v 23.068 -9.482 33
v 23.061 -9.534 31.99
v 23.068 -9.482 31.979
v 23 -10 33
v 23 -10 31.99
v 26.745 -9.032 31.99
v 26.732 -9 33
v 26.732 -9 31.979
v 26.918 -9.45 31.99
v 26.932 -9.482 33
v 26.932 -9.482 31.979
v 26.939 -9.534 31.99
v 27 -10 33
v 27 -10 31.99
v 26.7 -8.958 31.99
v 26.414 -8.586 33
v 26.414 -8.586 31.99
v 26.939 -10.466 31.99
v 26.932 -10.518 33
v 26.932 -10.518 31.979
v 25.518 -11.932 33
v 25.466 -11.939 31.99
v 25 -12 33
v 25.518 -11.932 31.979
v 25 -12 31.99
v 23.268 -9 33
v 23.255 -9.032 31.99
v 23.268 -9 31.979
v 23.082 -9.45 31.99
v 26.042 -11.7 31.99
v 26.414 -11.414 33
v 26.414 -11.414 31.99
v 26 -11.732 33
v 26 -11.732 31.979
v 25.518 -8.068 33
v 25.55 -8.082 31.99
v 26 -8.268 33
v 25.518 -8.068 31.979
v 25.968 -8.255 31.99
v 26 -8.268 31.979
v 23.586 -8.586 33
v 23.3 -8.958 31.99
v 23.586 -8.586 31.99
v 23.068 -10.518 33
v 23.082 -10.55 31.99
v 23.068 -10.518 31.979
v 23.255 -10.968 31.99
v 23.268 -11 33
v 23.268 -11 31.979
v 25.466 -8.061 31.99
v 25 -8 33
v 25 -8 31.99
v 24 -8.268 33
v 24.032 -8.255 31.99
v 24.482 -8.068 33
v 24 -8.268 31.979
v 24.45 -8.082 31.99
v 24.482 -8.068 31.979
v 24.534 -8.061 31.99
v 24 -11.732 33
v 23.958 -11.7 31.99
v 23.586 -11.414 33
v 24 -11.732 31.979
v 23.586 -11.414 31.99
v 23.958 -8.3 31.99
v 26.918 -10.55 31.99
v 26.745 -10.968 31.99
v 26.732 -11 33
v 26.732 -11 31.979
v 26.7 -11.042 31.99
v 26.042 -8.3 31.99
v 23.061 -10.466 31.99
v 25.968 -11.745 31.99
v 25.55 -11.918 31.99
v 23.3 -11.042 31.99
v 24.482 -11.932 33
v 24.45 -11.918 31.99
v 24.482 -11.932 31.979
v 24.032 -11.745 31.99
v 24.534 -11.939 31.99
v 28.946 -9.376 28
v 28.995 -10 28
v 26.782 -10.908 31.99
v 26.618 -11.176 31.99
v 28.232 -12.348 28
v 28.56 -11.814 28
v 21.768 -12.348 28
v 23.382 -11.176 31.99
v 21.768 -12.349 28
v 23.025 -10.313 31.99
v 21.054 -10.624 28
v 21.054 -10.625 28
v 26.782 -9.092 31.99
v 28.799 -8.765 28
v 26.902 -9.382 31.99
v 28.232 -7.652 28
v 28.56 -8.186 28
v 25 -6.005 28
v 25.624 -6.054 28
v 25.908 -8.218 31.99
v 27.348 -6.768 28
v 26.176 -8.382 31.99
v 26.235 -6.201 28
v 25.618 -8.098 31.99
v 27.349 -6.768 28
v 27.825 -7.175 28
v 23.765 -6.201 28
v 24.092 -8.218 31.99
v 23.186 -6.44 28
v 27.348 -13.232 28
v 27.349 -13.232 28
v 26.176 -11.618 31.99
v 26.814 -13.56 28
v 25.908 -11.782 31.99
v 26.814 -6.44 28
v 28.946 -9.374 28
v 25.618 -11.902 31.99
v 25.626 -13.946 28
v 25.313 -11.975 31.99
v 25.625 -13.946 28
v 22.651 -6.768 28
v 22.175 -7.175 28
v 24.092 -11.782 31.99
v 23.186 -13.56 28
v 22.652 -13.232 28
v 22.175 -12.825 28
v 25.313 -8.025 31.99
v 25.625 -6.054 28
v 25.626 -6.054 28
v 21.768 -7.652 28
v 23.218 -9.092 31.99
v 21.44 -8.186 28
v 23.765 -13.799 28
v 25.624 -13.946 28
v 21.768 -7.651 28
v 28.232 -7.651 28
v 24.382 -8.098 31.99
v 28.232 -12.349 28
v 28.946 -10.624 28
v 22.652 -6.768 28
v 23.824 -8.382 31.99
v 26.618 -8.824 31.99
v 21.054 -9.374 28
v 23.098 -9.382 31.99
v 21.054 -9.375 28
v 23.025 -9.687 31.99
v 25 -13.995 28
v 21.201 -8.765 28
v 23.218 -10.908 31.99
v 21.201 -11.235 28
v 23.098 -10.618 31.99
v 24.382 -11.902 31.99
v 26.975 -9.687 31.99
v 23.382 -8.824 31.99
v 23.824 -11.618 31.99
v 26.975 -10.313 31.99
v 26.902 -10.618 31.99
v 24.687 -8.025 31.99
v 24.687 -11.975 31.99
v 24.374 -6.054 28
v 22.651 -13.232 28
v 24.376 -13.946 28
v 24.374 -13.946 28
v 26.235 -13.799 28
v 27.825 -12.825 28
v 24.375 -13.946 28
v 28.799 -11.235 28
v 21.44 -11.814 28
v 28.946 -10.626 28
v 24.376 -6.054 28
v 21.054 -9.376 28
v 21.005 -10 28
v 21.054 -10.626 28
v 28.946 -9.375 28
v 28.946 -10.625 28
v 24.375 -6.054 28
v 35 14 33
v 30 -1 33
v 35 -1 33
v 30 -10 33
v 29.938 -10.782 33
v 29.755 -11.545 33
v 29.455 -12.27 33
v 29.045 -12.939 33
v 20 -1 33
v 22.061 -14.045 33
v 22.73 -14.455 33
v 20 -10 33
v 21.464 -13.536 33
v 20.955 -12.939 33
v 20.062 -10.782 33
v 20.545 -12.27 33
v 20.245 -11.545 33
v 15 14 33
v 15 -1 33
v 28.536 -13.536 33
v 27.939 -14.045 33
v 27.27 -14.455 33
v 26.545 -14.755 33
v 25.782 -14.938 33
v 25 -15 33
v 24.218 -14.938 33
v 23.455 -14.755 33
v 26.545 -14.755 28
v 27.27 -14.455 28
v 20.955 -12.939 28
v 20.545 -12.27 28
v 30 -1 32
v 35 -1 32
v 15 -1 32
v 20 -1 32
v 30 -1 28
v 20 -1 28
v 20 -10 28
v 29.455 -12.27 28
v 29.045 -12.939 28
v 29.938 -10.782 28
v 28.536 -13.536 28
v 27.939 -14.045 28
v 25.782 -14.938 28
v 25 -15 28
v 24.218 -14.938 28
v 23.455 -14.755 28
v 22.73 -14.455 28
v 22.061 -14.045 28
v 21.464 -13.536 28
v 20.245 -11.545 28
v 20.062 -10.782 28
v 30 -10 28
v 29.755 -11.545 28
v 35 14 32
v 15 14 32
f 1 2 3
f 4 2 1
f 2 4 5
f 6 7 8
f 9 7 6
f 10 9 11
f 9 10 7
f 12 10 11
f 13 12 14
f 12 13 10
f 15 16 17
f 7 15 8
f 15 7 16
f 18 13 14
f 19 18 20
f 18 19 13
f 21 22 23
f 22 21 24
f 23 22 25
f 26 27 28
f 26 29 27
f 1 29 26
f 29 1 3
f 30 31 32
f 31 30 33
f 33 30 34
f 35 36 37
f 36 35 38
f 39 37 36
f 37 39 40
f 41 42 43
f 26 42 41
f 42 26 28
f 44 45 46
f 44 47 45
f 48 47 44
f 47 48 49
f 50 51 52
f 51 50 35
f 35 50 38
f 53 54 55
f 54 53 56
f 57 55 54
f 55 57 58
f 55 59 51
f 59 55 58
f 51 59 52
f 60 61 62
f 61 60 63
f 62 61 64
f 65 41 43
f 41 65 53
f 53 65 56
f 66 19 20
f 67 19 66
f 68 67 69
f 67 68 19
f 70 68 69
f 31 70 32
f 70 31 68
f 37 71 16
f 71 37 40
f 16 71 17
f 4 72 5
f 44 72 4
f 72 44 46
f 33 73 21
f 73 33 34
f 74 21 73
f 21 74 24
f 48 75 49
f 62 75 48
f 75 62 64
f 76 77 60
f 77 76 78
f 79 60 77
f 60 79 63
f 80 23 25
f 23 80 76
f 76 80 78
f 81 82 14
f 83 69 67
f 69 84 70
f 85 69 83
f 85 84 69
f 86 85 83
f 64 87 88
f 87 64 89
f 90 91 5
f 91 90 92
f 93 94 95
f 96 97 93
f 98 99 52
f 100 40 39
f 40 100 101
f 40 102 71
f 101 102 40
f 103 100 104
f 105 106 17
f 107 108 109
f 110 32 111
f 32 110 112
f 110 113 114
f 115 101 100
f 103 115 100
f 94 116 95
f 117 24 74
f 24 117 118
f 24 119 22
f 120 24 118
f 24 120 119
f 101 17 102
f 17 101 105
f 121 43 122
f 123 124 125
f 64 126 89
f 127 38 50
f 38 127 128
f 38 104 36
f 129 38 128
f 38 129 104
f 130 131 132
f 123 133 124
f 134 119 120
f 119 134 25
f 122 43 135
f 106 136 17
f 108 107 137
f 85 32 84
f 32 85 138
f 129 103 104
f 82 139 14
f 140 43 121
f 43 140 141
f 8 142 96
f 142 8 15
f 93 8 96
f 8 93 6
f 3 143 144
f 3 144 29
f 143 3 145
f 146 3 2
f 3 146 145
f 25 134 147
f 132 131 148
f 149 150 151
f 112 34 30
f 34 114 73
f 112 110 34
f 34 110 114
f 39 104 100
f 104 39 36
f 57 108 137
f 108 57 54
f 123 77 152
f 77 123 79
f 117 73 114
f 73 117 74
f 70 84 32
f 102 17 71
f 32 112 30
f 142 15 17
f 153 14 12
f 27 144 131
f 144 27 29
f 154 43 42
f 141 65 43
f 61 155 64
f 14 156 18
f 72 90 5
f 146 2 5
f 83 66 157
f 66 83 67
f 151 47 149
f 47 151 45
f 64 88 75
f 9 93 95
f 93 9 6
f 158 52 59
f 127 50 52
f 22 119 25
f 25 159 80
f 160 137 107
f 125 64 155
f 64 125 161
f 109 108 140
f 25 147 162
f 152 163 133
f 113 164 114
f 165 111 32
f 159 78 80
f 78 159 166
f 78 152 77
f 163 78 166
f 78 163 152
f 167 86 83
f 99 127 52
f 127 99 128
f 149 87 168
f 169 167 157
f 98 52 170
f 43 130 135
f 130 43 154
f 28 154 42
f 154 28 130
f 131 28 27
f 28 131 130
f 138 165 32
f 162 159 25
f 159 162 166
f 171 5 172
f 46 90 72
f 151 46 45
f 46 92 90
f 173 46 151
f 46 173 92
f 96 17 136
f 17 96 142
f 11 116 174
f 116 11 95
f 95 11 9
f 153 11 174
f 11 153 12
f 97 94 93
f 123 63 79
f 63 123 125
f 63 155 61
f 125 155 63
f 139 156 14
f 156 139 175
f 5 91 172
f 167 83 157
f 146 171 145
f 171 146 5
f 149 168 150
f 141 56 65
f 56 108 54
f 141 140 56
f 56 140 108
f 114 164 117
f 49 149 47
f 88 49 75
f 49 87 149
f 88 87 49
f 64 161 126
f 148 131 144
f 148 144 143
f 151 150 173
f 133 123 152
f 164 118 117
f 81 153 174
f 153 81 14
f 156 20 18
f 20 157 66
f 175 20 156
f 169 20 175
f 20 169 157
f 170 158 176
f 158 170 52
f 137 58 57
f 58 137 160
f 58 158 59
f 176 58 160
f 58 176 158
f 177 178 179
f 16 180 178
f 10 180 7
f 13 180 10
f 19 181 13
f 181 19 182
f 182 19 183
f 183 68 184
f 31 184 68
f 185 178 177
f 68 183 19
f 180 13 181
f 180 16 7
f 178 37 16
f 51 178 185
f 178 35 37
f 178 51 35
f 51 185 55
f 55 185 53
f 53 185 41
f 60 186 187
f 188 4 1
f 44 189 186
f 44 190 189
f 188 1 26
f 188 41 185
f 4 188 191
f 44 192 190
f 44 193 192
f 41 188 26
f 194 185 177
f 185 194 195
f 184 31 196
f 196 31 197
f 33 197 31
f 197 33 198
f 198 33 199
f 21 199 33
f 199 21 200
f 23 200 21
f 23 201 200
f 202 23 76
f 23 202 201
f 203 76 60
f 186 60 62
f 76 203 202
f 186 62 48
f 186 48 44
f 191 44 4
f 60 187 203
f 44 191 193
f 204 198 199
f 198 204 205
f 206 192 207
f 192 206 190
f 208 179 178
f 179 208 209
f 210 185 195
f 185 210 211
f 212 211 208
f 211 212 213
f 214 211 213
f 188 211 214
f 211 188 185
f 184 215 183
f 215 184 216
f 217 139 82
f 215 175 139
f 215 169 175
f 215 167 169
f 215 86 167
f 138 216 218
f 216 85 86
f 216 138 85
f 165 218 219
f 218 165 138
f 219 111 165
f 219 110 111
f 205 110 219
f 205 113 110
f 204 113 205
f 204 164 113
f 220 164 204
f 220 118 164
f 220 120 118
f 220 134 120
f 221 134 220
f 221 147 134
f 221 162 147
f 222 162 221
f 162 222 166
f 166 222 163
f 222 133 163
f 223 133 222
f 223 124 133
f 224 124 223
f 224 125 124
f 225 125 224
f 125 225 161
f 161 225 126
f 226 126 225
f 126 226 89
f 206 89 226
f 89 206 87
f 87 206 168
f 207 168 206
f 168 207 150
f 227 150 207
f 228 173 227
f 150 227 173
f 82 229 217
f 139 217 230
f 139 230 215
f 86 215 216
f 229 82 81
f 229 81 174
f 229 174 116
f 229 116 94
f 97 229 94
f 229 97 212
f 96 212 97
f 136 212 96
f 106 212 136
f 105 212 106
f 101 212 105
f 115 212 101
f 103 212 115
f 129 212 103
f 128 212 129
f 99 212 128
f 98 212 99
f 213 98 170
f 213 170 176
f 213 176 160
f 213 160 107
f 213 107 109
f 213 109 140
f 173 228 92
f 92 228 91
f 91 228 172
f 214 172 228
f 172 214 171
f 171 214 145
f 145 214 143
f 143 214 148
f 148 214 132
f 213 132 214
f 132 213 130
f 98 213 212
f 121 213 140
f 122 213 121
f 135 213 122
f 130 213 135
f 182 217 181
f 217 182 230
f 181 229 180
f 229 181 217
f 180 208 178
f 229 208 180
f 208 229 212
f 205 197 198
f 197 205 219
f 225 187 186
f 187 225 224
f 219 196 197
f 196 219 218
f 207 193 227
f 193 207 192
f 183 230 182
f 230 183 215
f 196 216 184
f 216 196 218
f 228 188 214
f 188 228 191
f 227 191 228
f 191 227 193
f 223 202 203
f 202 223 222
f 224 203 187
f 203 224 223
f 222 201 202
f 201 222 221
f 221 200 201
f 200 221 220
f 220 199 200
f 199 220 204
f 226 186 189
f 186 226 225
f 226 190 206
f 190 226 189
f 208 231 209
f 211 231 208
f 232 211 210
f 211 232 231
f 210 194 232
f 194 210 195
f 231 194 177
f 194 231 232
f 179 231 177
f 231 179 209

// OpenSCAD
for(x=[20,120]) !translate([x,-10,28]) {
  translate([-5,9,4]) linear_extrude(1) {
      square([20,15]);
  }
  difference() {
    linear_extrude(5,convexity=3) {
      square([10,9]);
      translate([5,0]) circle(d=10,$fn=40);
    }
    translate([5,0,-.01]) {
      cylinder(d=4,h=20,$fn=24);
      cylinder(d1=8,d2=4,h=4,$fn=40);
    }
  }
}
intersection(){ union() {
for(pos=[[2,90],[2,2],[137,2],[137,90]]) translate(pos) linear_extrude(40,convexity=3) difference() {
  circle(d=8,$fn=50);
  circle(d=3,$fn=20);
}
difference() {
intersection() {
  difference() {
  linear_extrude(40,convexity=4) difference(){
    offset(4,$fn=20) translate([2,2]) square([5.5*25.4-4,92-4]);
    translate([28,26]) {
      circle(d=13,$fn=40);
    }
    translate([24,67]) circle(d=36,$fn=60);
    translate([66,46]) {
      circle(d=10,$fn=30);
      translate([0,31]) circle(d=4,$fn=24);
      translate([0,-31]) circle(d=4,$fn=24);
      *translate([-22,-35]) square([44,70]);
    }
    
    	translate([110,25]) {
        translate([0,19.3915]) circle(d=4,$fn=30);
        for(y=[0,19.3915*2]) translate([0,y]) rotate([0,0,90]) difference() {
				circle(r=17.4625, h=15, center = true);
				translate([-24.2875,-15,-2]) square([10,37], center = false);
				translate([14.2875,-15,-2]) square([10,37], center = false);
								}
              }
            }
      translate([28,26]) translate([-8,-14.5,1.01]) cube([16,29,3]);
      translate([1.4,1.4,2]) minkowski() {
        translate([2,2,3.99]) cube([5.5*25.4-2.8-4,92-2.8-4,50]);
        sphere(r=4,$fn=20);
      }
  }
  *translate([5,60]) cube([47,28,2]);
}
  translate([-4,28,18]) rotate([90,180,90]) linear_extrude(10,convexity=3) plugin_profile();
}
  translate([0,0,40]) linear_extrude(2,convexity=3) difference() {
    offset(4,$fn=20) translate([2,2]) square([5.5*25.4-4,92-4]);
    for(pos=[[2,90],[2,2],[137,2],[137,90]]) translate(pos) 
  circle(d=3,$fn=20);

  }
}
  difference() {
    translate([-5,-5,28]) cube([5.5*25.4+8,100,30]);
    
    translate([0,0,36.01]) for(pos=[[2,90],[2,2],[137,2],[137,90]]) translate(pos)  {
      cylinder(d=6,h=6,$fn=20);
      translate([0,0,-3]) cylinder(d1=3,d2=6,h=3,$fn=20);
    }
  }
}

module plugin_profile()
{
  translate([-11.5,8]) mirror([0,1]) {
      offset(2) polygon([[0,0],[23,0],[23,12],[19,16],[4,16],[0,12]]);
      translate([-8.5,8]) circle(d=3,$fn=20);
      translate([31.5,8]) circle(d=3,$fn=20);
    }
}
